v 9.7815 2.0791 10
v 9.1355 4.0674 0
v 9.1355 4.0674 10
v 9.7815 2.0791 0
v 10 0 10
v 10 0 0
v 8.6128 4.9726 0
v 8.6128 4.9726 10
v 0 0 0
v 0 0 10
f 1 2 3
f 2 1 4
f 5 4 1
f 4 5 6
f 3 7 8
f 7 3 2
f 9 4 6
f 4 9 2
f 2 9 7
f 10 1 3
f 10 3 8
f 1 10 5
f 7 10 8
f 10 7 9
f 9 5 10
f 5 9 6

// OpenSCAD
intersection() {
	difference() {
		cylinder(r=10, h=10);
		rotate([0, 0, 30]) {
			cube(10);
		}
	}
	cube(10);
}
